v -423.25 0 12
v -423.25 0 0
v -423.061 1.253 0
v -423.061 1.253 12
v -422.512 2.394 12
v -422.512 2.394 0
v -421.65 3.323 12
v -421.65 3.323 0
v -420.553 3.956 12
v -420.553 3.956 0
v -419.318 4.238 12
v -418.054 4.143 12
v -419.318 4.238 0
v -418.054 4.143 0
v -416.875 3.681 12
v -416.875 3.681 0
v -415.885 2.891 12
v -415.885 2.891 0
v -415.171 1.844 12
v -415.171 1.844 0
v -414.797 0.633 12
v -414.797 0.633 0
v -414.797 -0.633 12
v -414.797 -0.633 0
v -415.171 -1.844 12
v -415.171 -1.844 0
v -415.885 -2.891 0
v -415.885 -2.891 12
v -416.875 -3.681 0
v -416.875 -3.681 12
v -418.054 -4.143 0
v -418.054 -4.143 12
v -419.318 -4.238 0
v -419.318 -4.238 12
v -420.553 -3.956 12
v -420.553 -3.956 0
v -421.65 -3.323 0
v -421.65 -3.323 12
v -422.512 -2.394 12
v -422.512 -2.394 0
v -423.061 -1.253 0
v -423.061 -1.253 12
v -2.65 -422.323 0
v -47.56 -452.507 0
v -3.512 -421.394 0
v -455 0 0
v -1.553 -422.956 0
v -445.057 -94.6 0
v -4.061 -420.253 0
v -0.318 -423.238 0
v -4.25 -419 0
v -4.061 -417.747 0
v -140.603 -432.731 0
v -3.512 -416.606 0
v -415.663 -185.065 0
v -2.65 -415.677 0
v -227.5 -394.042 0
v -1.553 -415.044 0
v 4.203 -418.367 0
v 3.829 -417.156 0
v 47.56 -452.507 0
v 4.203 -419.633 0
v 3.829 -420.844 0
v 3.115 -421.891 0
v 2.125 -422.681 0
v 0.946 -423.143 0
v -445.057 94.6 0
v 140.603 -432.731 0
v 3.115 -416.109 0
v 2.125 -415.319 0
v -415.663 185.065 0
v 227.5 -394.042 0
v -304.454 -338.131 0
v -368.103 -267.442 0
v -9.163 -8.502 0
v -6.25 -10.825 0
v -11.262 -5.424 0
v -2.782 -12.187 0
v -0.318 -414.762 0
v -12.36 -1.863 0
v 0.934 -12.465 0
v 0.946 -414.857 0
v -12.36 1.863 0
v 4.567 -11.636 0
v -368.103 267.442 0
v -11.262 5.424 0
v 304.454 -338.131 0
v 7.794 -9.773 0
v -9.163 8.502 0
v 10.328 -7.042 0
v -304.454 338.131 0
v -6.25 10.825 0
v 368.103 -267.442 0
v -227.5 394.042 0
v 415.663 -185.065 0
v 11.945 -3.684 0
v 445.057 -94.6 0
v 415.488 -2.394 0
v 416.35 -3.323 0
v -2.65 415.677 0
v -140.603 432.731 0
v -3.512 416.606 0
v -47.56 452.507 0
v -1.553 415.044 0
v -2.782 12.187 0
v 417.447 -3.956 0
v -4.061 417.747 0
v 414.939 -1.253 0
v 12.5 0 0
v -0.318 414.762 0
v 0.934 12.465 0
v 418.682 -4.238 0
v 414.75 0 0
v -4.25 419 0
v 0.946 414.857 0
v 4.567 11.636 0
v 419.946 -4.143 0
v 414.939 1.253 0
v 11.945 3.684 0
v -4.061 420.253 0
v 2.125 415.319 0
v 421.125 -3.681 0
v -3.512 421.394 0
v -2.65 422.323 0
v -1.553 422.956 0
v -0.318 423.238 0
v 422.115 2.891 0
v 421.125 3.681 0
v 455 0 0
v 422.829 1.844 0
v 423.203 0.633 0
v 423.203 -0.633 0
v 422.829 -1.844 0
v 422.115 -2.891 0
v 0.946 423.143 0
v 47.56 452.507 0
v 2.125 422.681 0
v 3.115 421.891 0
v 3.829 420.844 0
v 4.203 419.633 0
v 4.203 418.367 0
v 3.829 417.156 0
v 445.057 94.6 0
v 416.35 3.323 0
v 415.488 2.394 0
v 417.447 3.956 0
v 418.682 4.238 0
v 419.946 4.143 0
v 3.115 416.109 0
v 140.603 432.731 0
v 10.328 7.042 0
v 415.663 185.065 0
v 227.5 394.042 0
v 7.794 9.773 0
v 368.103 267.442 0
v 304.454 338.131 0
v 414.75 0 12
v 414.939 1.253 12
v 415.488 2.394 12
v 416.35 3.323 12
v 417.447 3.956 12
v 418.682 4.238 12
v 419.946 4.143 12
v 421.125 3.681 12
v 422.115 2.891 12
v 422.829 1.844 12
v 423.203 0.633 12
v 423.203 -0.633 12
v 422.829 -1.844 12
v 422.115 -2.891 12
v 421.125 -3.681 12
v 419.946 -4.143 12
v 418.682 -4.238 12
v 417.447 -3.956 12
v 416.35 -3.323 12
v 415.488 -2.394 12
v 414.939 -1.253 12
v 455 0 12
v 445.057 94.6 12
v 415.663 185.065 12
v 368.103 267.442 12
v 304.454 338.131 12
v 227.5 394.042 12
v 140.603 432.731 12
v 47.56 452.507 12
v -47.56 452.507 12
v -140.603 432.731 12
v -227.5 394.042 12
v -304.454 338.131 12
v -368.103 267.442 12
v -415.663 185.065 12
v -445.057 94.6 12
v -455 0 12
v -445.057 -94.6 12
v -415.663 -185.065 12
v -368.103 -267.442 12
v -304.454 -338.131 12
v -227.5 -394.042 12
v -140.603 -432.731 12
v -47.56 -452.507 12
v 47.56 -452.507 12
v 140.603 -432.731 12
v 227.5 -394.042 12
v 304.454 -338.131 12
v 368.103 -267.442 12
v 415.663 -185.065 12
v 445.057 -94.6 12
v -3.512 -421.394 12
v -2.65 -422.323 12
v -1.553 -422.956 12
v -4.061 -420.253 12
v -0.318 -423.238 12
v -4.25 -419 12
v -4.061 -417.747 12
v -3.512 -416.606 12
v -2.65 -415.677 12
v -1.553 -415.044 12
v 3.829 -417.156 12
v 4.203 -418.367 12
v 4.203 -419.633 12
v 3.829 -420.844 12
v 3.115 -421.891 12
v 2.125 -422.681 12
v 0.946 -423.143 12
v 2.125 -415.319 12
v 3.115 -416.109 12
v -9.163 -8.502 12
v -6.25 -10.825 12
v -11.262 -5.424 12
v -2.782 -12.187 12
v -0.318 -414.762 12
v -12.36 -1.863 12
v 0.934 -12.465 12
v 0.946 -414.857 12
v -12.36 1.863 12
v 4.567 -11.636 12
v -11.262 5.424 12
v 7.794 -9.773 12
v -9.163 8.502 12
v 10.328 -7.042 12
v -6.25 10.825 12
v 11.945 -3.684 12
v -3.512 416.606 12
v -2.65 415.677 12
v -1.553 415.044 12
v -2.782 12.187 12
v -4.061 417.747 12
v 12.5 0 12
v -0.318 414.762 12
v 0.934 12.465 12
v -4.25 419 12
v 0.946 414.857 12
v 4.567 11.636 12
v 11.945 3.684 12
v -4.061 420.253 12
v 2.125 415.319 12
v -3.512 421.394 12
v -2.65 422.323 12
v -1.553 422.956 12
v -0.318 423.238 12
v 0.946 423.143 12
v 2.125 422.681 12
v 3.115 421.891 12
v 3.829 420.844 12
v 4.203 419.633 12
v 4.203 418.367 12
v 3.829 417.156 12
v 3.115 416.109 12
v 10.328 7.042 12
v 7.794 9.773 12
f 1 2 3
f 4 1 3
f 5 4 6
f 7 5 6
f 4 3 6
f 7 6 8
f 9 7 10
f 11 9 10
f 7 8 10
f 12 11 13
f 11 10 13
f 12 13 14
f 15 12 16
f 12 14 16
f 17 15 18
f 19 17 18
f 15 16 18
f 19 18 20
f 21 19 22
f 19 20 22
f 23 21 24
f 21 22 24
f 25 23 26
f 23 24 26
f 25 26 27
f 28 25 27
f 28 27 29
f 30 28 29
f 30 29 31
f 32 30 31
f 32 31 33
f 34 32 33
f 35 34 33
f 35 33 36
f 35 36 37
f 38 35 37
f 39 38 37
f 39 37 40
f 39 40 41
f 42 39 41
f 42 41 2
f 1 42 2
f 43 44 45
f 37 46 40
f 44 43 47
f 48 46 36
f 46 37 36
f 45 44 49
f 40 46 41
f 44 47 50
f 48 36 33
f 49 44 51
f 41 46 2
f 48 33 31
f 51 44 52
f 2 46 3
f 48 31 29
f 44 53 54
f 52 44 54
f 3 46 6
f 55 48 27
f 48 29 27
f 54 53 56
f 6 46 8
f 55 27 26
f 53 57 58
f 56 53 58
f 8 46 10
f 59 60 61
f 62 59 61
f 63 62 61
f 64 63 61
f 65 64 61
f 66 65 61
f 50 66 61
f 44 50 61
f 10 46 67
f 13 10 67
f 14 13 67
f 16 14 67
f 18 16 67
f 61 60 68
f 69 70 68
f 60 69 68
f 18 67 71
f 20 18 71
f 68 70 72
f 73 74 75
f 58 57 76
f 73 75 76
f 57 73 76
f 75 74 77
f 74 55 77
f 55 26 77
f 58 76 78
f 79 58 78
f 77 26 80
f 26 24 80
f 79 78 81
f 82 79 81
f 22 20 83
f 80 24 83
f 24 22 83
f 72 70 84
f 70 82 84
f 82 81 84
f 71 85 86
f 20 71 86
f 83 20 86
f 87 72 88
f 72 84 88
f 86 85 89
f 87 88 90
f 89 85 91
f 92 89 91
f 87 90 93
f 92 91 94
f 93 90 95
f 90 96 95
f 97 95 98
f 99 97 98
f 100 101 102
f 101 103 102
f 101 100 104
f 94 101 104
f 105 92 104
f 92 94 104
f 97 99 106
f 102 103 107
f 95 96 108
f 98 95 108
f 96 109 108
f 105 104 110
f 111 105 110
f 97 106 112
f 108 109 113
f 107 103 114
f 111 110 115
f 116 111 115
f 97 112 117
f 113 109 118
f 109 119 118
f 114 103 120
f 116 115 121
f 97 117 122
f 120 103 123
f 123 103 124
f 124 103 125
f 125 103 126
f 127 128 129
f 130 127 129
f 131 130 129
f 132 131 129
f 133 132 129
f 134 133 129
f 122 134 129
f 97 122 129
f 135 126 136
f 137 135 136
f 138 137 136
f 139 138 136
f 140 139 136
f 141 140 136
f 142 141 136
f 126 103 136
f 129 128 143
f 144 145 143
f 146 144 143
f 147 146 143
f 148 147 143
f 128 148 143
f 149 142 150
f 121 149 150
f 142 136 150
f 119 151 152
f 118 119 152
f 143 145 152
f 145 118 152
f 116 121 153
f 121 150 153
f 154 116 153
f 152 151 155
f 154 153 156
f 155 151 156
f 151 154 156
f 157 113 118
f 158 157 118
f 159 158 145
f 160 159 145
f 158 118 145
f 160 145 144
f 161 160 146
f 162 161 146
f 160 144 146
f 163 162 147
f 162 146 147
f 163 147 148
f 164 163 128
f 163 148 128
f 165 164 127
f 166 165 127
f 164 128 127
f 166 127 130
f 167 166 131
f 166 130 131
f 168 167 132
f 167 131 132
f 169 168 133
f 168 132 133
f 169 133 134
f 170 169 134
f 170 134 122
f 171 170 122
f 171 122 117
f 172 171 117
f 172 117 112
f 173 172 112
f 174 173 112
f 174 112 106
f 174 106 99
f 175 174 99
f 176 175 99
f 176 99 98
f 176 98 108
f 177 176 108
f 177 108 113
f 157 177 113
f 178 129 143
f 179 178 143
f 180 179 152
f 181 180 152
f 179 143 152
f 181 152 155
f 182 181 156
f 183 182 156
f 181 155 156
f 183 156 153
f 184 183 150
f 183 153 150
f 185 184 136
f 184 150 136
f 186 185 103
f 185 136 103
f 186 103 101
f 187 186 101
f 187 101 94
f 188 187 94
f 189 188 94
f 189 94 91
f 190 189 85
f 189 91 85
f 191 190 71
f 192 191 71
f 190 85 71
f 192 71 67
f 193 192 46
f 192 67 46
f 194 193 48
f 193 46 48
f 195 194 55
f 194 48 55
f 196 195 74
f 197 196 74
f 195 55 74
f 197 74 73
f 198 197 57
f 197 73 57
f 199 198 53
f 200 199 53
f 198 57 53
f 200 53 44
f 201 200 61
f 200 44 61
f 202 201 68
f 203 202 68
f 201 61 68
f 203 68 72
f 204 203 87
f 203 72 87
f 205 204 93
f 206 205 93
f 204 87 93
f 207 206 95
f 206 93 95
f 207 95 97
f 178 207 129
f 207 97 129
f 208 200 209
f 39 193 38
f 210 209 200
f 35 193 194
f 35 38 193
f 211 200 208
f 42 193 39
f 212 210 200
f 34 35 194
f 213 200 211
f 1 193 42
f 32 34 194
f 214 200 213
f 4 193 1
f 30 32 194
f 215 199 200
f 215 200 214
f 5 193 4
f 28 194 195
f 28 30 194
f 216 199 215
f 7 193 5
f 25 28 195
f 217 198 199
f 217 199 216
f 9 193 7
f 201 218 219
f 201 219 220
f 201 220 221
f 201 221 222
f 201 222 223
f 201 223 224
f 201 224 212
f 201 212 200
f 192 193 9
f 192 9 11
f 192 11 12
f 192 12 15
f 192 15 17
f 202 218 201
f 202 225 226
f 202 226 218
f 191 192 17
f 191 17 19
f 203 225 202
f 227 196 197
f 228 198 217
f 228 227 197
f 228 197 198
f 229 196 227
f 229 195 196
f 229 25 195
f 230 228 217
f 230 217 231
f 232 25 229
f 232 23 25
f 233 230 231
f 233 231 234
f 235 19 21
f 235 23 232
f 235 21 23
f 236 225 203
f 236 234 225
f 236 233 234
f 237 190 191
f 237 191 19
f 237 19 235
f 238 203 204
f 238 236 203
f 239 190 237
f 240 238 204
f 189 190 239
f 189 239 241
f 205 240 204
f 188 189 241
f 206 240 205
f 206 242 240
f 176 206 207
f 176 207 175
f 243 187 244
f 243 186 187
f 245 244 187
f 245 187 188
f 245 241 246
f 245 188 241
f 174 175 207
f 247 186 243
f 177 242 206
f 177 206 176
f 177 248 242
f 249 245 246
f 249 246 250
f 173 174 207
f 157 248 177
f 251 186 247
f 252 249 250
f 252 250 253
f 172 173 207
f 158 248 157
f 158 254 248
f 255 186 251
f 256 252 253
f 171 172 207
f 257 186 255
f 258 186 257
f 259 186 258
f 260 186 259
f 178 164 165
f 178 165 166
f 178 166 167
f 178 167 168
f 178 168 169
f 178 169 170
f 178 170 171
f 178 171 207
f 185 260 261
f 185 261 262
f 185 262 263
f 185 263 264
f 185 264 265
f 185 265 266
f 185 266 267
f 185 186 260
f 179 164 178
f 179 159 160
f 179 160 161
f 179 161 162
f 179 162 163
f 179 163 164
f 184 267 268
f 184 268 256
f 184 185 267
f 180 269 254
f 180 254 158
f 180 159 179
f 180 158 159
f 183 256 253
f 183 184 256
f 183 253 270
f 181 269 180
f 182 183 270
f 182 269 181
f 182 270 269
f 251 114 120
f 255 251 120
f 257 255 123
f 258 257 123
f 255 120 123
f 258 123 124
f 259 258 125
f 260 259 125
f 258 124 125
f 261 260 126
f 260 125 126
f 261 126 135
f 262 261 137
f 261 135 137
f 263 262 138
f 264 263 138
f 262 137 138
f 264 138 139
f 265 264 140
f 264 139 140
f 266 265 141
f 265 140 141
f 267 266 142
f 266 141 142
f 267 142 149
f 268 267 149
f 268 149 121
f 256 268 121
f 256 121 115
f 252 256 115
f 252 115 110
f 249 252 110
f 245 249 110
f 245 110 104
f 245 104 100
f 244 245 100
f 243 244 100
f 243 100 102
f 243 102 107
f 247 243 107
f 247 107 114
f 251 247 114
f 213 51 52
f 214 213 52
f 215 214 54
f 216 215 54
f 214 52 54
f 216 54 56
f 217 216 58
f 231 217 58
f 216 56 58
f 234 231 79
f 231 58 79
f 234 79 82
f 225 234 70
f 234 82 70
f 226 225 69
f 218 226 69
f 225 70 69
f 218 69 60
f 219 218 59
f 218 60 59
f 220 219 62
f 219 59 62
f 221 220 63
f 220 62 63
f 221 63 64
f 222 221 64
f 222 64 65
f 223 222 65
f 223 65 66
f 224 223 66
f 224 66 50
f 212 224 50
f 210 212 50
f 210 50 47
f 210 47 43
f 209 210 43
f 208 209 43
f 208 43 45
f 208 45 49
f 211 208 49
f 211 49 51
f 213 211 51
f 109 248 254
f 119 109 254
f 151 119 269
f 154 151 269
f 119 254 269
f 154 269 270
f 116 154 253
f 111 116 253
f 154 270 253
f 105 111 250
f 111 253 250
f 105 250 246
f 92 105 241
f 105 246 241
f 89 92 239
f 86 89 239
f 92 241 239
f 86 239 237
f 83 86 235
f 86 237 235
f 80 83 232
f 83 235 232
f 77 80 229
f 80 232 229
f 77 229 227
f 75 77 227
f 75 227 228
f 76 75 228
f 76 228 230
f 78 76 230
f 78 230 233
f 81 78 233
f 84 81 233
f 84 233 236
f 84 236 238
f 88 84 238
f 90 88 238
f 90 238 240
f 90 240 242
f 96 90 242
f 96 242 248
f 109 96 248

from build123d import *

# Parameters (mm, degrees)
IZIM1_R                     = 455
Y_KSEKLIK_EKSTR_ZYON1_DEPTH = 12
IZIM2_R                     = 12.5
KES_EKSTR_ZYON1_DEPTH       = 644.579054973
F_8_5_8_5_AP_DELIK1_D       = 8.5


with BuildPart() as part:
    # Çizim1 → Yükseklik-Ekstrüzyon1 (new body)
    with BuildSketch(Plane.XY):
        Circle(IZIM1_R)
    extrude(amount=Y_KSEKLIK_EKSTR_ZYON1_DEPTH)

    # Çizim2 → Kes-Ekstrüzyon1 (cut, through all)
    with BuildSketch(Plane.XY.offset(12)):
        Circle(IZIM2_R)
    extrude(amount=-KES_EKSTR_ZYON1_DEPTH, mode=Mode.SUBTRACT)

    # Ø8.5 (8.5) Çap Delik1 (through all)
    with Locations(Plane.XY.offset(12)):
        with Locations((0, 419), (419, 0), (0, -419), (-419, 0)):
            Hole(F_8_5_8_5_AP_DELIK1_D / 2)


solid = part.part
